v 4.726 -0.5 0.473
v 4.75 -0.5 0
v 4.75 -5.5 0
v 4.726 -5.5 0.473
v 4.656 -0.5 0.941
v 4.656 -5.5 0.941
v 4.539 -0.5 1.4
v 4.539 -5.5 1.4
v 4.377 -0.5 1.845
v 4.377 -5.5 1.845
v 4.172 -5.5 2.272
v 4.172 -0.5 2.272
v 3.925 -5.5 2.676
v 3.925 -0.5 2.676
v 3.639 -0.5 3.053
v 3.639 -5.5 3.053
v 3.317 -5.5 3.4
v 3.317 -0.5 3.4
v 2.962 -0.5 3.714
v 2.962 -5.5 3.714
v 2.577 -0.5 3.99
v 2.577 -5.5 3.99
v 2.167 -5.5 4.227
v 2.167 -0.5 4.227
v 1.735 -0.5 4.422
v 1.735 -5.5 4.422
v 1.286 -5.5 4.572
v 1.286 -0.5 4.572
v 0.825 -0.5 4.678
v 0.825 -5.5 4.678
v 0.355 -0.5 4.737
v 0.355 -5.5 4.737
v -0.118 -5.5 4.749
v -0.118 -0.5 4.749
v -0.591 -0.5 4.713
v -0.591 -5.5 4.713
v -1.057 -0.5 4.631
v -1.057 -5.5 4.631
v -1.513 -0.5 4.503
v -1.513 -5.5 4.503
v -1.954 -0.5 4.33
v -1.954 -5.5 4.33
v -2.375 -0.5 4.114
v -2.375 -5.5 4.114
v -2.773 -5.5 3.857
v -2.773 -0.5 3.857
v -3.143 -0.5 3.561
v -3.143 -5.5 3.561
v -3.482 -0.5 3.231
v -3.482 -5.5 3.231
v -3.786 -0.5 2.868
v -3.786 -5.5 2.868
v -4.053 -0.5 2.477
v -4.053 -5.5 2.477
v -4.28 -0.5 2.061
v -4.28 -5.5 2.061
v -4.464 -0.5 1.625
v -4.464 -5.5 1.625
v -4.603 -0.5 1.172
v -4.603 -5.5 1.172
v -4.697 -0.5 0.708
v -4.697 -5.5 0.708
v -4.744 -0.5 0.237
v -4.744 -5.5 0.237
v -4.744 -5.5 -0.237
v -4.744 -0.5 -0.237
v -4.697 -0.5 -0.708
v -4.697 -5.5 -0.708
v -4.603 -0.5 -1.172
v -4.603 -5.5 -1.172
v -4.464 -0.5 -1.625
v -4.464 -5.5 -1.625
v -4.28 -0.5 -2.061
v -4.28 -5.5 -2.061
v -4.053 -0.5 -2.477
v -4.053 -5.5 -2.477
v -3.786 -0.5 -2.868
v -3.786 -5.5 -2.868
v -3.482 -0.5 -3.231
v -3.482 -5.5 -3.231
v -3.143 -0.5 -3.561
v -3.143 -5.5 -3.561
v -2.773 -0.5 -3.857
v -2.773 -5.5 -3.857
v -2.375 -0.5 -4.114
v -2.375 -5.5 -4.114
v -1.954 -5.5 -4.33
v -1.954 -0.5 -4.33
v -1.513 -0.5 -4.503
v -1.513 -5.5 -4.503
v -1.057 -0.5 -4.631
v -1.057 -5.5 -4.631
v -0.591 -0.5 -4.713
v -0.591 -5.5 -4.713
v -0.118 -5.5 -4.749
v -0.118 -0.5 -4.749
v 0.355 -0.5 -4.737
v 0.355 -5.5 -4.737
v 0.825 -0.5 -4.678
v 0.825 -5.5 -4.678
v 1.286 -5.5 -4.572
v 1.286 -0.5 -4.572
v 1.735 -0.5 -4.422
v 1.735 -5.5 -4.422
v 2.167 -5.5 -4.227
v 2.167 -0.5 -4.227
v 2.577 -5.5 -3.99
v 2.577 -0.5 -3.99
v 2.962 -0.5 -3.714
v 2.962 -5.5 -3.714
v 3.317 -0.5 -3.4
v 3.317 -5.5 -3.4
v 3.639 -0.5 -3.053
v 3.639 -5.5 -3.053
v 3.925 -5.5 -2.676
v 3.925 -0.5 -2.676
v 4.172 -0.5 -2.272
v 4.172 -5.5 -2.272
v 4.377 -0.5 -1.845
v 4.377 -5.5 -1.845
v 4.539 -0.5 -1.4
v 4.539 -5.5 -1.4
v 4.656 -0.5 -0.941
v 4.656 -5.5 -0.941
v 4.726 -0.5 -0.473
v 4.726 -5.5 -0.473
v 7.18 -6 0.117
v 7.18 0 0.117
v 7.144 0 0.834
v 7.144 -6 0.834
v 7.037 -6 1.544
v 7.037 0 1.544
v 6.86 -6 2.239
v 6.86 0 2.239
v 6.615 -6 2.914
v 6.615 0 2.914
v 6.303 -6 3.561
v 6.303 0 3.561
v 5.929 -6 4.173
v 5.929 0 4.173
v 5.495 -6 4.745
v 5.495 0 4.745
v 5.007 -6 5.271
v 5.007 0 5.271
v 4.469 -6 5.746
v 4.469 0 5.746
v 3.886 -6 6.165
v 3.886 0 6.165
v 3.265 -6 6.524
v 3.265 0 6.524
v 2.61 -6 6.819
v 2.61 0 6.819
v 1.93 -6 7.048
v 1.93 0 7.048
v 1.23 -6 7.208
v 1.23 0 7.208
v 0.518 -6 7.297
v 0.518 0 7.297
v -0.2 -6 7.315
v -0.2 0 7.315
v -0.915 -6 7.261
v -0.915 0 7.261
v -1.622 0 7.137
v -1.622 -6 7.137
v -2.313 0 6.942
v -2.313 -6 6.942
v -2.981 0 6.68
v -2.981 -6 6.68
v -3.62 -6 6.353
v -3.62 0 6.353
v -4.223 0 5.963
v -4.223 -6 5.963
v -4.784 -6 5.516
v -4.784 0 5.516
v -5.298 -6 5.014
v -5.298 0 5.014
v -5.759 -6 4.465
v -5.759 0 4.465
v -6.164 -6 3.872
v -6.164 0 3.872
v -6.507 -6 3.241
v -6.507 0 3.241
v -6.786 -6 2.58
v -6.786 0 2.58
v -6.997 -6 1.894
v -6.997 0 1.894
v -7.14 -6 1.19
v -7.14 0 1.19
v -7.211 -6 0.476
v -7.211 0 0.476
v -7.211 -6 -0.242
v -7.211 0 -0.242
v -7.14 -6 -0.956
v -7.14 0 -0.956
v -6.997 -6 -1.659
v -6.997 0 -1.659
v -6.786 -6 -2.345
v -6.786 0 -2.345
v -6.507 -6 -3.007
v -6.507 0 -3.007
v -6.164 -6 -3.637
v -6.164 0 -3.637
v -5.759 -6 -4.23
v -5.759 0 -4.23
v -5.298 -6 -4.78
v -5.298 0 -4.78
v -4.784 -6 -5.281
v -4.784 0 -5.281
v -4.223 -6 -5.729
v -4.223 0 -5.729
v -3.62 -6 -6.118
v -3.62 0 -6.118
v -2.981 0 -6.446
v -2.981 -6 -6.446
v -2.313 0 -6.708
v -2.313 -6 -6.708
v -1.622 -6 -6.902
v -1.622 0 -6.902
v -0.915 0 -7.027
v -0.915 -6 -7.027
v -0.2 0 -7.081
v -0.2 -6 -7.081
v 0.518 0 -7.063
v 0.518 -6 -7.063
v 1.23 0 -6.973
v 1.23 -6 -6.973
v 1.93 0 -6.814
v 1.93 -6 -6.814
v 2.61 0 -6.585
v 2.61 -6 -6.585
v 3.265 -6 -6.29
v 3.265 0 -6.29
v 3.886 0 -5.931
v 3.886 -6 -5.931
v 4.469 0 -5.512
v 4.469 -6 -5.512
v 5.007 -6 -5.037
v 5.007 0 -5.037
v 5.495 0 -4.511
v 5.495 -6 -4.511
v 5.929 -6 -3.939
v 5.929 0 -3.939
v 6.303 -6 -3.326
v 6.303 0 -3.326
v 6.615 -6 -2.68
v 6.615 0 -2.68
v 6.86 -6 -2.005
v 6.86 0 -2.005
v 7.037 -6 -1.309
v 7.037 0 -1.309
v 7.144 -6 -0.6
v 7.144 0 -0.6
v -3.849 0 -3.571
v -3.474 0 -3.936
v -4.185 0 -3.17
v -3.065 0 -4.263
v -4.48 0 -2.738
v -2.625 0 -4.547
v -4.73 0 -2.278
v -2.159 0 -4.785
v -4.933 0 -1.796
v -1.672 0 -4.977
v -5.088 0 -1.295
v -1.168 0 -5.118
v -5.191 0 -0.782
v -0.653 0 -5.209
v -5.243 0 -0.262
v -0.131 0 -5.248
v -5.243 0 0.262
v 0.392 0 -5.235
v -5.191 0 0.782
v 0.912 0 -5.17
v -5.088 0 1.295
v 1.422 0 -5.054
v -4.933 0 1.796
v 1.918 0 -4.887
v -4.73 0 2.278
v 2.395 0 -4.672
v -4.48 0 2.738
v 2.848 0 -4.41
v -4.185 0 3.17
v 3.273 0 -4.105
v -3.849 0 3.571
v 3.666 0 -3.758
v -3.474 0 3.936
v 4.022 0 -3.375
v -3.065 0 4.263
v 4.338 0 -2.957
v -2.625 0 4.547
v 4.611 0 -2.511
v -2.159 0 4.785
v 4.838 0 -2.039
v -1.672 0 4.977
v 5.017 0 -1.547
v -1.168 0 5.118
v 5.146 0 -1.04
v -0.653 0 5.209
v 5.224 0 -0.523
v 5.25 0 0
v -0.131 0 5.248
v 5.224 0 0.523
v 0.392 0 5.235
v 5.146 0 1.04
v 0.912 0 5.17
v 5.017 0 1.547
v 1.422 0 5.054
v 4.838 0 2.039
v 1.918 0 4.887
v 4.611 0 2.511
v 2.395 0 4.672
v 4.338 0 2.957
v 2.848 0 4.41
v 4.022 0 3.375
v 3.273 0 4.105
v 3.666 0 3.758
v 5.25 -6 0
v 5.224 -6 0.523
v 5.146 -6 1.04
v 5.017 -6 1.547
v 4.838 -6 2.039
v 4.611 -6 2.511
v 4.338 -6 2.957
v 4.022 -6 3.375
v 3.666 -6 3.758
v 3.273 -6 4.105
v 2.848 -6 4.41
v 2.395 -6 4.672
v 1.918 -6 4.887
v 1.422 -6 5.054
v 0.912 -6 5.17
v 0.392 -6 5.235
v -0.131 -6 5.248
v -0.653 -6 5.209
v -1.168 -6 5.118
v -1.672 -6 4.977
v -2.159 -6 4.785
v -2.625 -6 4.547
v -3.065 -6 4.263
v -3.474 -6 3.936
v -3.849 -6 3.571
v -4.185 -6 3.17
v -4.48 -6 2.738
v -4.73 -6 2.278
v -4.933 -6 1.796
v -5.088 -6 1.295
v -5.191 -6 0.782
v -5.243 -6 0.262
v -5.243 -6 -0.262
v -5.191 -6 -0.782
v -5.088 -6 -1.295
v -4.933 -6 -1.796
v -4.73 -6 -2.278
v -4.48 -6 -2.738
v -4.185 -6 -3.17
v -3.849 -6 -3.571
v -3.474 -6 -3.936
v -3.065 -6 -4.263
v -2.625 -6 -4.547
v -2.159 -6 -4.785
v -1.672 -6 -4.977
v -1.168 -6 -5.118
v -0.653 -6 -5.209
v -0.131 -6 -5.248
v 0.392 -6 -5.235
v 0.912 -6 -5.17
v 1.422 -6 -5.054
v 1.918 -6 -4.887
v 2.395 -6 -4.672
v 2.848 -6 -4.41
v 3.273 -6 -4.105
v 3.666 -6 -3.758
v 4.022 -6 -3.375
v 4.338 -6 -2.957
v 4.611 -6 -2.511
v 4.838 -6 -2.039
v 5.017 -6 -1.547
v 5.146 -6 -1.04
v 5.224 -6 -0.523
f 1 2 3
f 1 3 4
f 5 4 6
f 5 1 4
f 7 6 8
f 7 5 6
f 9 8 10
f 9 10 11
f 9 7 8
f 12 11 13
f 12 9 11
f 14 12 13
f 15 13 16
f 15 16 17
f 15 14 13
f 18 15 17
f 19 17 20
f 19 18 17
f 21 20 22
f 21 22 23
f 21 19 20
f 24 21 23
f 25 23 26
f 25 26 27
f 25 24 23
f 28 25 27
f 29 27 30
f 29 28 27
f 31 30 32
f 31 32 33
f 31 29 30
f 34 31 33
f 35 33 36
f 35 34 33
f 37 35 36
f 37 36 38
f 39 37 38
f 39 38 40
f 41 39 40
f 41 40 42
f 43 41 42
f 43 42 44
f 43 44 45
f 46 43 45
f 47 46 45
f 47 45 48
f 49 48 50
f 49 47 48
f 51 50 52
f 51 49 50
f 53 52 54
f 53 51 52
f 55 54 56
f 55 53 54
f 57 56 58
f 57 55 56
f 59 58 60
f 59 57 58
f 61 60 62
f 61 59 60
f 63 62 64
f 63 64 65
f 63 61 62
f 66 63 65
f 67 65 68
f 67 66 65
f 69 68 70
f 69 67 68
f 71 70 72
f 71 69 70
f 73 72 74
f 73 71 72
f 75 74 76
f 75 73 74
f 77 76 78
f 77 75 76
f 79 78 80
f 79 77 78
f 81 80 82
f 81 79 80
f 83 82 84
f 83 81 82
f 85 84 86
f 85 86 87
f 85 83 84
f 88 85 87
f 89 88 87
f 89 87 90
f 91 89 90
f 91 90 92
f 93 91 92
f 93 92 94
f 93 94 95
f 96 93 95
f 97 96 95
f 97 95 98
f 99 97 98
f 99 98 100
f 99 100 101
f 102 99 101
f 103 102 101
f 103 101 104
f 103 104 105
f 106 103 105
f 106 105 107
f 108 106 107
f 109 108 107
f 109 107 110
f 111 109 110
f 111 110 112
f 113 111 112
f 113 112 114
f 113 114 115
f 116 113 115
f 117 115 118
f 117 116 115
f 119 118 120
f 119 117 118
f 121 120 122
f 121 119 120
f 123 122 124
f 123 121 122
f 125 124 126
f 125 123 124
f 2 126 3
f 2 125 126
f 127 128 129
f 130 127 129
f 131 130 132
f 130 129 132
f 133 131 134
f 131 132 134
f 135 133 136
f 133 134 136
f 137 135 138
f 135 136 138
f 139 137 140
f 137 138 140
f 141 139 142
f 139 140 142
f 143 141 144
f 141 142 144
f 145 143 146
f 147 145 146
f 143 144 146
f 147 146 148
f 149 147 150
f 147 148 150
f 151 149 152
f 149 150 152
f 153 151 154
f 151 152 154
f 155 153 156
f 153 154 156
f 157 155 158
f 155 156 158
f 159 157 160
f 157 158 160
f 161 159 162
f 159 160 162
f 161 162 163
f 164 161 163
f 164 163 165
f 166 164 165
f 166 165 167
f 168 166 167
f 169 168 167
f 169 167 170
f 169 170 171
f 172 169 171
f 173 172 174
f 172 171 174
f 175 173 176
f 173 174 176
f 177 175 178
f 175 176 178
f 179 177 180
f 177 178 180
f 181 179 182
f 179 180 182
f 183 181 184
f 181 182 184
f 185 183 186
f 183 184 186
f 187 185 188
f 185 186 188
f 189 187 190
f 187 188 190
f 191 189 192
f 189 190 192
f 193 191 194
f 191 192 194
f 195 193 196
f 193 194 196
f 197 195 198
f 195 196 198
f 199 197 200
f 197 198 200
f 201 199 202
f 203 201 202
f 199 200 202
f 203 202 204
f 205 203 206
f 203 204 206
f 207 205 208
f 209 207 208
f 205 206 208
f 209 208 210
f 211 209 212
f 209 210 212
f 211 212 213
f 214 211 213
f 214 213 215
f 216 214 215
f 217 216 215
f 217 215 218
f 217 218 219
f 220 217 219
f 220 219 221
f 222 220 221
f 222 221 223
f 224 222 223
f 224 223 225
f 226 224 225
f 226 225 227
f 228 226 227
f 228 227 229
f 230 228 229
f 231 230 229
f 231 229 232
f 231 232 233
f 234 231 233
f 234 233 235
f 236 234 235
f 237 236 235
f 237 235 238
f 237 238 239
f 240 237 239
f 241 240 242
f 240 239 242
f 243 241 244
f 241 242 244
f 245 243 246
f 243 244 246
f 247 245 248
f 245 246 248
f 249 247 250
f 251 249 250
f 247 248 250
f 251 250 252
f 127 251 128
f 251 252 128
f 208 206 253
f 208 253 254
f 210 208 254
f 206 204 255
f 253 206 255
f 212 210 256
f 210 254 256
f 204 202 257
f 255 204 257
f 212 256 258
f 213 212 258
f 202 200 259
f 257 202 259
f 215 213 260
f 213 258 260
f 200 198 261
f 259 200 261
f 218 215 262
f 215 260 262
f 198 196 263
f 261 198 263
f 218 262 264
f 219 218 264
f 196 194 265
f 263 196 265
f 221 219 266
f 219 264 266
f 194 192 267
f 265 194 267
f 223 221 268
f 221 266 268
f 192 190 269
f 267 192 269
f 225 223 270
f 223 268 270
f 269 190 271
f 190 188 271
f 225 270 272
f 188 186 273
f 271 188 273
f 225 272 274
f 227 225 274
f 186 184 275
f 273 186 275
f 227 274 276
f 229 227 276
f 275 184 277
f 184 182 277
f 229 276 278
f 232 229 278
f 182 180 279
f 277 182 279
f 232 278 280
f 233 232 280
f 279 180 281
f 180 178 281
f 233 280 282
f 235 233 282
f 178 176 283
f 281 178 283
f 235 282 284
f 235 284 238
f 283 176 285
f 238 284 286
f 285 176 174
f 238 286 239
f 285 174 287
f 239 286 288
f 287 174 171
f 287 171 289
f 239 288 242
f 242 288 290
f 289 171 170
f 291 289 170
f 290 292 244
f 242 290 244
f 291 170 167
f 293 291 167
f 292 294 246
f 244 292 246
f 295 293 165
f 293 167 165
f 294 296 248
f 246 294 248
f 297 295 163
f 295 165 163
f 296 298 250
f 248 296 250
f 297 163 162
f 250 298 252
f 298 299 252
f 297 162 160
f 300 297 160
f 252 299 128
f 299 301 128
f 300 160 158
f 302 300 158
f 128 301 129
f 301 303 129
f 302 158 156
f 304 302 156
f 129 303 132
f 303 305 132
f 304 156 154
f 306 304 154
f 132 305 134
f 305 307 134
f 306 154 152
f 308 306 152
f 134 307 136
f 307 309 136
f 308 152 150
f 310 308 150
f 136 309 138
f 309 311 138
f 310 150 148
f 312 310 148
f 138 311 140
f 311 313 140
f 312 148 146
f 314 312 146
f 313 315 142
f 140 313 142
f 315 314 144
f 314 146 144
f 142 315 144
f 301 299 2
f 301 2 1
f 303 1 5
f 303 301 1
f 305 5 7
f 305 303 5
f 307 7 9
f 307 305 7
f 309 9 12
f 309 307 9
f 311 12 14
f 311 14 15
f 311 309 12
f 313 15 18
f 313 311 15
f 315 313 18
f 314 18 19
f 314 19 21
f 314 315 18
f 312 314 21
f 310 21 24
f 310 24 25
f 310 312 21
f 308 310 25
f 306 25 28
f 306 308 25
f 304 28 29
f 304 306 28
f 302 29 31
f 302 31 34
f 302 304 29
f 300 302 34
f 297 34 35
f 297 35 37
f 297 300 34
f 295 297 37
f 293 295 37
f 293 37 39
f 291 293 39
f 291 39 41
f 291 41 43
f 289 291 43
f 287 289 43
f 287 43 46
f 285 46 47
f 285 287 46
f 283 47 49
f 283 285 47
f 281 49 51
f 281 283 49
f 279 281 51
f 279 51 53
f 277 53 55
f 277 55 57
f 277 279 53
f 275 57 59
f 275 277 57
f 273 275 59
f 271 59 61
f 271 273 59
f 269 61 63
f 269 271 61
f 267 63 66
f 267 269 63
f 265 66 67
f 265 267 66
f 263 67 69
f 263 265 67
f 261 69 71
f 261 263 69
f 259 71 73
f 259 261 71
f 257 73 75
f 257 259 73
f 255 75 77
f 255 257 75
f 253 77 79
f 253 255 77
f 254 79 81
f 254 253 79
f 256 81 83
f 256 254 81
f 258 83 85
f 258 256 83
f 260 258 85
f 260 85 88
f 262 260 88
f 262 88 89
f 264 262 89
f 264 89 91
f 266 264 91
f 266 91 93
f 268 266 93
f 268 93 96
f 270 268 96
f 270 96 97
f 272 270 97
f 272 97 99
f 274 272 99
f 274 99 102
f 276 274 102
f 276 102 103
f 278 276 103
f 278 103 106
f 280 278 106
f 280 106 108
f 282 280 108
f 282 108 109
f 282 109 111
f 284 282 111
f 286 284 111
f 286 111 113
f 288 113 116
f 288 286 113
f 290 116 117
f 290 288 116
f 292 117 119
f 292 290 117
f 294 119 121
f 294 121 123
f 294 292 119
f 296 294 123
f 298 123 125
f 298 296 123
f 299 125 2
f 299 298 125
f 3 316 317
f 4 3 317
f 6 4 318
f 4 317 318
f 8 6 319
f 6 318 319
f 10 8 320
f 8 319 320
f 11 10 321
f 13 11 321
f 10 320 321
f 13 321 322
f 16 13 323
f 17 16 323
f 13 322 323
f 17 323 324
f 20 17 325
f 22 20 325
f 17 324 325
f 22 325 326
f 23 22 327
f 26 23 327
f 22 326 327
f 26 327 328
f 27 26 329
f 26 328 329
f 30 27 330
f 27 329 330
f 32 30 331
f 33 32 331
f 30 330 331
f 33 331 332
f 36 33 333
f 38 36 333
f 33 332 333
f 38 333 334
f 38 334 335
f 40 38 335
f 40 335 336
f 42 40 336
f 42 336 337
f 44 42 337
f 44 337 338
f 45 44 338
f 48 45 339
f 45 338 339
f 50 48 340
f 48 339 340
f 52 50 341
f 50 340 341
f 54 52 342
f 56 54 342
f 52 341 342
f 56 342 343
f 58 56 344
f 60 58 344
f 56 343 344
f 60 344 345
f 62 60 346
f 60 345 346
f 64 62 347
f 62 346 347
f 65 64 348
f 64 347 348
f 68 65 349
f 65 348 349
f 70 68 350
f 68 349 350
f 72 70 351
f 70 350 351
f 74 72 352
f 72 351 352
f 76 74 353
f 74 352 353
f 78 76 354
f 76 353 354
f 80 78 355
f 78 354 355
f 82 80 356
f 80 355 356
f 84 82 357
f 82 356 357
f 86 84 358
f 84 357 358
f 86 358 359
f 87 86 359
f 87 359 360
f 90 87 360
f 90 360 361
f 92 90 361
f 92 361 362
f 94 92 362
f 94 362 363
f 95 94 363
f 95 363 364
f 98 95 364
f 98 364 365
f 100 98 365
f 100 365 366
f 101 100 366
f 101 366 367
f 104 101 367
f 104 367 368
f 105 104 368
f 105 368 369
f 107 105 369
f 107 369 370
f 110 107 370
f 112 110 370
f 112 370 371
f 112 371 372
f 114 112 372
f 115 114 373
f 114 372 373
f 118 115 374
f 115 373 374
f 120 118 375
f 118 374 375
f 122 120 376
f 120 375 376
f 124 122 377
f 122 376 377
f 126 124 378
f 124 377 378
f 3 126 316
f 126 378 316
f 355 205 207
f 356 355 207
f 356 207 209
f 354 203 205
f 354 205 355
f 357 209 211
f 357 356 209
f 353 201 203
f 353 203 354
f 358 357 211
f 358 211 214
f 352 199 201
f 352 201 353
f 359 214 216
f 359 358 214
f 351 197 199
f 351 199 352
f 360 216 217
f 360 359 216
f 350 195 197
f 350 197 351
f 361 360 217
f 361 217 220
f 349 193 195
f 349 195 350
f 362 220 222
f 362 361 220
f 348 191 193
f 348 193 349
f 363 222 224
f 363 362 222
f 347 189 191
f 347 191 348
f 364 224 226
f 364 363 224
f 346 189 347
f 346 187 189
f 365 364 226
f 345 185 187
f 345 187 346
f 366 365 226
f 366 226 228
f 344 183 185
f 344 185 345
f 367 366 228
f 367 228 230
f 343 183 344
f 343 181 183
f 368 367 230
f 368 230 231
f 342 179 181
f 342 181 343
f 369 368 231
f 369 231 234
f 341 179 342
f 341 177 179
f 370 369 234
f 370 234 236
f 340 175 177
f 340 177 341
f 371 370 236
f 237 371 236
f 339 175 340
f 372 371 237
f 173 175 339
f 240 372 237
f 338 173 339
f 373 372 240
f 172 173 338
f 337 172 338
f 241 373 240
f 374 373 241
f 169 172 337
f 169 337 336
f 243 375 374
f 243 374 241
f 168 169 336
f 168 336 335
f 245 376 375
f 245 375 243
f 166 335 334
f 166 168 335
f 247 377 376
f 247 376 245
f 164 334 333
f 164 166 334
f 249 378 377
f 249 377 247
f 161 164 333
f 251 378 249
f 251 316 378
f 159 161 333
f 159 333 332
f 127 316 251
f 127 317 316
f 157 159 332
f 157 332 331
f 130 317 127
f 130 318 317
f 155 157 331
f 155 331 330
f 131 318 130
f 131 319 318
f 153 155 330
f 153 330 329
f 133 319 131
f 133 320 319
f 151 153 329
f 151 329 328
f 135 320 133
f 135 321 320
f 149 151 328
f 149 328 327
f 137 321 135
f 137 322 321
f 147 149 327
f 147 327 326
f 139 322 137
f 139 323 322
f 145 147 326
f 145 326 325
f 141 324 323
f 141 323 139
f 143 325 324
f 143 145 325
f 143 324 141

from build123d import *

# Parameters (mm, degrees)
F0_R      = 7.2
F0_R_2    = 4.75
F0_R_3    = 4.5
F1_DEPTH  = 6
F1_FACE_R = 4.5
F2_DEPTH  = 6.001
F3_SIZE2  = 0.5
F3_SIZE   = 0.5


with BuildPart() as f1:
    # F0 (on Front) → F1 (new body)
    with BuildSketch(Plane.XZ):
        with Locations((-0.020111, 0.117168)):
            Circle(F0_R)
        Circle(F0_R_2, mode=Mode.SUBTRACT)
        Circle(F0_R_3)
    extrude(amount=F1_DEPTH)

    # F1_face (on face) → F2 (cut, through all)
    with BuildSketch(Plane.XZ.offset(6)):
        Circle(F1_FACE_R)
    extrude(amount=-F2_DEPTH, mode=Mode.SUBTRACT)

    # F3
    f3_edges = [f1.edges().sort_by_distance(p)[0] for p in [
        (4.75, -3, 0),
        (-4.75, 0, 0),
        (-4.75, -6, 0),
    ]]
    chamfer(f3_edges, length=F3_SIZE, length2=F3_SIZE2)


solid = f1.part
